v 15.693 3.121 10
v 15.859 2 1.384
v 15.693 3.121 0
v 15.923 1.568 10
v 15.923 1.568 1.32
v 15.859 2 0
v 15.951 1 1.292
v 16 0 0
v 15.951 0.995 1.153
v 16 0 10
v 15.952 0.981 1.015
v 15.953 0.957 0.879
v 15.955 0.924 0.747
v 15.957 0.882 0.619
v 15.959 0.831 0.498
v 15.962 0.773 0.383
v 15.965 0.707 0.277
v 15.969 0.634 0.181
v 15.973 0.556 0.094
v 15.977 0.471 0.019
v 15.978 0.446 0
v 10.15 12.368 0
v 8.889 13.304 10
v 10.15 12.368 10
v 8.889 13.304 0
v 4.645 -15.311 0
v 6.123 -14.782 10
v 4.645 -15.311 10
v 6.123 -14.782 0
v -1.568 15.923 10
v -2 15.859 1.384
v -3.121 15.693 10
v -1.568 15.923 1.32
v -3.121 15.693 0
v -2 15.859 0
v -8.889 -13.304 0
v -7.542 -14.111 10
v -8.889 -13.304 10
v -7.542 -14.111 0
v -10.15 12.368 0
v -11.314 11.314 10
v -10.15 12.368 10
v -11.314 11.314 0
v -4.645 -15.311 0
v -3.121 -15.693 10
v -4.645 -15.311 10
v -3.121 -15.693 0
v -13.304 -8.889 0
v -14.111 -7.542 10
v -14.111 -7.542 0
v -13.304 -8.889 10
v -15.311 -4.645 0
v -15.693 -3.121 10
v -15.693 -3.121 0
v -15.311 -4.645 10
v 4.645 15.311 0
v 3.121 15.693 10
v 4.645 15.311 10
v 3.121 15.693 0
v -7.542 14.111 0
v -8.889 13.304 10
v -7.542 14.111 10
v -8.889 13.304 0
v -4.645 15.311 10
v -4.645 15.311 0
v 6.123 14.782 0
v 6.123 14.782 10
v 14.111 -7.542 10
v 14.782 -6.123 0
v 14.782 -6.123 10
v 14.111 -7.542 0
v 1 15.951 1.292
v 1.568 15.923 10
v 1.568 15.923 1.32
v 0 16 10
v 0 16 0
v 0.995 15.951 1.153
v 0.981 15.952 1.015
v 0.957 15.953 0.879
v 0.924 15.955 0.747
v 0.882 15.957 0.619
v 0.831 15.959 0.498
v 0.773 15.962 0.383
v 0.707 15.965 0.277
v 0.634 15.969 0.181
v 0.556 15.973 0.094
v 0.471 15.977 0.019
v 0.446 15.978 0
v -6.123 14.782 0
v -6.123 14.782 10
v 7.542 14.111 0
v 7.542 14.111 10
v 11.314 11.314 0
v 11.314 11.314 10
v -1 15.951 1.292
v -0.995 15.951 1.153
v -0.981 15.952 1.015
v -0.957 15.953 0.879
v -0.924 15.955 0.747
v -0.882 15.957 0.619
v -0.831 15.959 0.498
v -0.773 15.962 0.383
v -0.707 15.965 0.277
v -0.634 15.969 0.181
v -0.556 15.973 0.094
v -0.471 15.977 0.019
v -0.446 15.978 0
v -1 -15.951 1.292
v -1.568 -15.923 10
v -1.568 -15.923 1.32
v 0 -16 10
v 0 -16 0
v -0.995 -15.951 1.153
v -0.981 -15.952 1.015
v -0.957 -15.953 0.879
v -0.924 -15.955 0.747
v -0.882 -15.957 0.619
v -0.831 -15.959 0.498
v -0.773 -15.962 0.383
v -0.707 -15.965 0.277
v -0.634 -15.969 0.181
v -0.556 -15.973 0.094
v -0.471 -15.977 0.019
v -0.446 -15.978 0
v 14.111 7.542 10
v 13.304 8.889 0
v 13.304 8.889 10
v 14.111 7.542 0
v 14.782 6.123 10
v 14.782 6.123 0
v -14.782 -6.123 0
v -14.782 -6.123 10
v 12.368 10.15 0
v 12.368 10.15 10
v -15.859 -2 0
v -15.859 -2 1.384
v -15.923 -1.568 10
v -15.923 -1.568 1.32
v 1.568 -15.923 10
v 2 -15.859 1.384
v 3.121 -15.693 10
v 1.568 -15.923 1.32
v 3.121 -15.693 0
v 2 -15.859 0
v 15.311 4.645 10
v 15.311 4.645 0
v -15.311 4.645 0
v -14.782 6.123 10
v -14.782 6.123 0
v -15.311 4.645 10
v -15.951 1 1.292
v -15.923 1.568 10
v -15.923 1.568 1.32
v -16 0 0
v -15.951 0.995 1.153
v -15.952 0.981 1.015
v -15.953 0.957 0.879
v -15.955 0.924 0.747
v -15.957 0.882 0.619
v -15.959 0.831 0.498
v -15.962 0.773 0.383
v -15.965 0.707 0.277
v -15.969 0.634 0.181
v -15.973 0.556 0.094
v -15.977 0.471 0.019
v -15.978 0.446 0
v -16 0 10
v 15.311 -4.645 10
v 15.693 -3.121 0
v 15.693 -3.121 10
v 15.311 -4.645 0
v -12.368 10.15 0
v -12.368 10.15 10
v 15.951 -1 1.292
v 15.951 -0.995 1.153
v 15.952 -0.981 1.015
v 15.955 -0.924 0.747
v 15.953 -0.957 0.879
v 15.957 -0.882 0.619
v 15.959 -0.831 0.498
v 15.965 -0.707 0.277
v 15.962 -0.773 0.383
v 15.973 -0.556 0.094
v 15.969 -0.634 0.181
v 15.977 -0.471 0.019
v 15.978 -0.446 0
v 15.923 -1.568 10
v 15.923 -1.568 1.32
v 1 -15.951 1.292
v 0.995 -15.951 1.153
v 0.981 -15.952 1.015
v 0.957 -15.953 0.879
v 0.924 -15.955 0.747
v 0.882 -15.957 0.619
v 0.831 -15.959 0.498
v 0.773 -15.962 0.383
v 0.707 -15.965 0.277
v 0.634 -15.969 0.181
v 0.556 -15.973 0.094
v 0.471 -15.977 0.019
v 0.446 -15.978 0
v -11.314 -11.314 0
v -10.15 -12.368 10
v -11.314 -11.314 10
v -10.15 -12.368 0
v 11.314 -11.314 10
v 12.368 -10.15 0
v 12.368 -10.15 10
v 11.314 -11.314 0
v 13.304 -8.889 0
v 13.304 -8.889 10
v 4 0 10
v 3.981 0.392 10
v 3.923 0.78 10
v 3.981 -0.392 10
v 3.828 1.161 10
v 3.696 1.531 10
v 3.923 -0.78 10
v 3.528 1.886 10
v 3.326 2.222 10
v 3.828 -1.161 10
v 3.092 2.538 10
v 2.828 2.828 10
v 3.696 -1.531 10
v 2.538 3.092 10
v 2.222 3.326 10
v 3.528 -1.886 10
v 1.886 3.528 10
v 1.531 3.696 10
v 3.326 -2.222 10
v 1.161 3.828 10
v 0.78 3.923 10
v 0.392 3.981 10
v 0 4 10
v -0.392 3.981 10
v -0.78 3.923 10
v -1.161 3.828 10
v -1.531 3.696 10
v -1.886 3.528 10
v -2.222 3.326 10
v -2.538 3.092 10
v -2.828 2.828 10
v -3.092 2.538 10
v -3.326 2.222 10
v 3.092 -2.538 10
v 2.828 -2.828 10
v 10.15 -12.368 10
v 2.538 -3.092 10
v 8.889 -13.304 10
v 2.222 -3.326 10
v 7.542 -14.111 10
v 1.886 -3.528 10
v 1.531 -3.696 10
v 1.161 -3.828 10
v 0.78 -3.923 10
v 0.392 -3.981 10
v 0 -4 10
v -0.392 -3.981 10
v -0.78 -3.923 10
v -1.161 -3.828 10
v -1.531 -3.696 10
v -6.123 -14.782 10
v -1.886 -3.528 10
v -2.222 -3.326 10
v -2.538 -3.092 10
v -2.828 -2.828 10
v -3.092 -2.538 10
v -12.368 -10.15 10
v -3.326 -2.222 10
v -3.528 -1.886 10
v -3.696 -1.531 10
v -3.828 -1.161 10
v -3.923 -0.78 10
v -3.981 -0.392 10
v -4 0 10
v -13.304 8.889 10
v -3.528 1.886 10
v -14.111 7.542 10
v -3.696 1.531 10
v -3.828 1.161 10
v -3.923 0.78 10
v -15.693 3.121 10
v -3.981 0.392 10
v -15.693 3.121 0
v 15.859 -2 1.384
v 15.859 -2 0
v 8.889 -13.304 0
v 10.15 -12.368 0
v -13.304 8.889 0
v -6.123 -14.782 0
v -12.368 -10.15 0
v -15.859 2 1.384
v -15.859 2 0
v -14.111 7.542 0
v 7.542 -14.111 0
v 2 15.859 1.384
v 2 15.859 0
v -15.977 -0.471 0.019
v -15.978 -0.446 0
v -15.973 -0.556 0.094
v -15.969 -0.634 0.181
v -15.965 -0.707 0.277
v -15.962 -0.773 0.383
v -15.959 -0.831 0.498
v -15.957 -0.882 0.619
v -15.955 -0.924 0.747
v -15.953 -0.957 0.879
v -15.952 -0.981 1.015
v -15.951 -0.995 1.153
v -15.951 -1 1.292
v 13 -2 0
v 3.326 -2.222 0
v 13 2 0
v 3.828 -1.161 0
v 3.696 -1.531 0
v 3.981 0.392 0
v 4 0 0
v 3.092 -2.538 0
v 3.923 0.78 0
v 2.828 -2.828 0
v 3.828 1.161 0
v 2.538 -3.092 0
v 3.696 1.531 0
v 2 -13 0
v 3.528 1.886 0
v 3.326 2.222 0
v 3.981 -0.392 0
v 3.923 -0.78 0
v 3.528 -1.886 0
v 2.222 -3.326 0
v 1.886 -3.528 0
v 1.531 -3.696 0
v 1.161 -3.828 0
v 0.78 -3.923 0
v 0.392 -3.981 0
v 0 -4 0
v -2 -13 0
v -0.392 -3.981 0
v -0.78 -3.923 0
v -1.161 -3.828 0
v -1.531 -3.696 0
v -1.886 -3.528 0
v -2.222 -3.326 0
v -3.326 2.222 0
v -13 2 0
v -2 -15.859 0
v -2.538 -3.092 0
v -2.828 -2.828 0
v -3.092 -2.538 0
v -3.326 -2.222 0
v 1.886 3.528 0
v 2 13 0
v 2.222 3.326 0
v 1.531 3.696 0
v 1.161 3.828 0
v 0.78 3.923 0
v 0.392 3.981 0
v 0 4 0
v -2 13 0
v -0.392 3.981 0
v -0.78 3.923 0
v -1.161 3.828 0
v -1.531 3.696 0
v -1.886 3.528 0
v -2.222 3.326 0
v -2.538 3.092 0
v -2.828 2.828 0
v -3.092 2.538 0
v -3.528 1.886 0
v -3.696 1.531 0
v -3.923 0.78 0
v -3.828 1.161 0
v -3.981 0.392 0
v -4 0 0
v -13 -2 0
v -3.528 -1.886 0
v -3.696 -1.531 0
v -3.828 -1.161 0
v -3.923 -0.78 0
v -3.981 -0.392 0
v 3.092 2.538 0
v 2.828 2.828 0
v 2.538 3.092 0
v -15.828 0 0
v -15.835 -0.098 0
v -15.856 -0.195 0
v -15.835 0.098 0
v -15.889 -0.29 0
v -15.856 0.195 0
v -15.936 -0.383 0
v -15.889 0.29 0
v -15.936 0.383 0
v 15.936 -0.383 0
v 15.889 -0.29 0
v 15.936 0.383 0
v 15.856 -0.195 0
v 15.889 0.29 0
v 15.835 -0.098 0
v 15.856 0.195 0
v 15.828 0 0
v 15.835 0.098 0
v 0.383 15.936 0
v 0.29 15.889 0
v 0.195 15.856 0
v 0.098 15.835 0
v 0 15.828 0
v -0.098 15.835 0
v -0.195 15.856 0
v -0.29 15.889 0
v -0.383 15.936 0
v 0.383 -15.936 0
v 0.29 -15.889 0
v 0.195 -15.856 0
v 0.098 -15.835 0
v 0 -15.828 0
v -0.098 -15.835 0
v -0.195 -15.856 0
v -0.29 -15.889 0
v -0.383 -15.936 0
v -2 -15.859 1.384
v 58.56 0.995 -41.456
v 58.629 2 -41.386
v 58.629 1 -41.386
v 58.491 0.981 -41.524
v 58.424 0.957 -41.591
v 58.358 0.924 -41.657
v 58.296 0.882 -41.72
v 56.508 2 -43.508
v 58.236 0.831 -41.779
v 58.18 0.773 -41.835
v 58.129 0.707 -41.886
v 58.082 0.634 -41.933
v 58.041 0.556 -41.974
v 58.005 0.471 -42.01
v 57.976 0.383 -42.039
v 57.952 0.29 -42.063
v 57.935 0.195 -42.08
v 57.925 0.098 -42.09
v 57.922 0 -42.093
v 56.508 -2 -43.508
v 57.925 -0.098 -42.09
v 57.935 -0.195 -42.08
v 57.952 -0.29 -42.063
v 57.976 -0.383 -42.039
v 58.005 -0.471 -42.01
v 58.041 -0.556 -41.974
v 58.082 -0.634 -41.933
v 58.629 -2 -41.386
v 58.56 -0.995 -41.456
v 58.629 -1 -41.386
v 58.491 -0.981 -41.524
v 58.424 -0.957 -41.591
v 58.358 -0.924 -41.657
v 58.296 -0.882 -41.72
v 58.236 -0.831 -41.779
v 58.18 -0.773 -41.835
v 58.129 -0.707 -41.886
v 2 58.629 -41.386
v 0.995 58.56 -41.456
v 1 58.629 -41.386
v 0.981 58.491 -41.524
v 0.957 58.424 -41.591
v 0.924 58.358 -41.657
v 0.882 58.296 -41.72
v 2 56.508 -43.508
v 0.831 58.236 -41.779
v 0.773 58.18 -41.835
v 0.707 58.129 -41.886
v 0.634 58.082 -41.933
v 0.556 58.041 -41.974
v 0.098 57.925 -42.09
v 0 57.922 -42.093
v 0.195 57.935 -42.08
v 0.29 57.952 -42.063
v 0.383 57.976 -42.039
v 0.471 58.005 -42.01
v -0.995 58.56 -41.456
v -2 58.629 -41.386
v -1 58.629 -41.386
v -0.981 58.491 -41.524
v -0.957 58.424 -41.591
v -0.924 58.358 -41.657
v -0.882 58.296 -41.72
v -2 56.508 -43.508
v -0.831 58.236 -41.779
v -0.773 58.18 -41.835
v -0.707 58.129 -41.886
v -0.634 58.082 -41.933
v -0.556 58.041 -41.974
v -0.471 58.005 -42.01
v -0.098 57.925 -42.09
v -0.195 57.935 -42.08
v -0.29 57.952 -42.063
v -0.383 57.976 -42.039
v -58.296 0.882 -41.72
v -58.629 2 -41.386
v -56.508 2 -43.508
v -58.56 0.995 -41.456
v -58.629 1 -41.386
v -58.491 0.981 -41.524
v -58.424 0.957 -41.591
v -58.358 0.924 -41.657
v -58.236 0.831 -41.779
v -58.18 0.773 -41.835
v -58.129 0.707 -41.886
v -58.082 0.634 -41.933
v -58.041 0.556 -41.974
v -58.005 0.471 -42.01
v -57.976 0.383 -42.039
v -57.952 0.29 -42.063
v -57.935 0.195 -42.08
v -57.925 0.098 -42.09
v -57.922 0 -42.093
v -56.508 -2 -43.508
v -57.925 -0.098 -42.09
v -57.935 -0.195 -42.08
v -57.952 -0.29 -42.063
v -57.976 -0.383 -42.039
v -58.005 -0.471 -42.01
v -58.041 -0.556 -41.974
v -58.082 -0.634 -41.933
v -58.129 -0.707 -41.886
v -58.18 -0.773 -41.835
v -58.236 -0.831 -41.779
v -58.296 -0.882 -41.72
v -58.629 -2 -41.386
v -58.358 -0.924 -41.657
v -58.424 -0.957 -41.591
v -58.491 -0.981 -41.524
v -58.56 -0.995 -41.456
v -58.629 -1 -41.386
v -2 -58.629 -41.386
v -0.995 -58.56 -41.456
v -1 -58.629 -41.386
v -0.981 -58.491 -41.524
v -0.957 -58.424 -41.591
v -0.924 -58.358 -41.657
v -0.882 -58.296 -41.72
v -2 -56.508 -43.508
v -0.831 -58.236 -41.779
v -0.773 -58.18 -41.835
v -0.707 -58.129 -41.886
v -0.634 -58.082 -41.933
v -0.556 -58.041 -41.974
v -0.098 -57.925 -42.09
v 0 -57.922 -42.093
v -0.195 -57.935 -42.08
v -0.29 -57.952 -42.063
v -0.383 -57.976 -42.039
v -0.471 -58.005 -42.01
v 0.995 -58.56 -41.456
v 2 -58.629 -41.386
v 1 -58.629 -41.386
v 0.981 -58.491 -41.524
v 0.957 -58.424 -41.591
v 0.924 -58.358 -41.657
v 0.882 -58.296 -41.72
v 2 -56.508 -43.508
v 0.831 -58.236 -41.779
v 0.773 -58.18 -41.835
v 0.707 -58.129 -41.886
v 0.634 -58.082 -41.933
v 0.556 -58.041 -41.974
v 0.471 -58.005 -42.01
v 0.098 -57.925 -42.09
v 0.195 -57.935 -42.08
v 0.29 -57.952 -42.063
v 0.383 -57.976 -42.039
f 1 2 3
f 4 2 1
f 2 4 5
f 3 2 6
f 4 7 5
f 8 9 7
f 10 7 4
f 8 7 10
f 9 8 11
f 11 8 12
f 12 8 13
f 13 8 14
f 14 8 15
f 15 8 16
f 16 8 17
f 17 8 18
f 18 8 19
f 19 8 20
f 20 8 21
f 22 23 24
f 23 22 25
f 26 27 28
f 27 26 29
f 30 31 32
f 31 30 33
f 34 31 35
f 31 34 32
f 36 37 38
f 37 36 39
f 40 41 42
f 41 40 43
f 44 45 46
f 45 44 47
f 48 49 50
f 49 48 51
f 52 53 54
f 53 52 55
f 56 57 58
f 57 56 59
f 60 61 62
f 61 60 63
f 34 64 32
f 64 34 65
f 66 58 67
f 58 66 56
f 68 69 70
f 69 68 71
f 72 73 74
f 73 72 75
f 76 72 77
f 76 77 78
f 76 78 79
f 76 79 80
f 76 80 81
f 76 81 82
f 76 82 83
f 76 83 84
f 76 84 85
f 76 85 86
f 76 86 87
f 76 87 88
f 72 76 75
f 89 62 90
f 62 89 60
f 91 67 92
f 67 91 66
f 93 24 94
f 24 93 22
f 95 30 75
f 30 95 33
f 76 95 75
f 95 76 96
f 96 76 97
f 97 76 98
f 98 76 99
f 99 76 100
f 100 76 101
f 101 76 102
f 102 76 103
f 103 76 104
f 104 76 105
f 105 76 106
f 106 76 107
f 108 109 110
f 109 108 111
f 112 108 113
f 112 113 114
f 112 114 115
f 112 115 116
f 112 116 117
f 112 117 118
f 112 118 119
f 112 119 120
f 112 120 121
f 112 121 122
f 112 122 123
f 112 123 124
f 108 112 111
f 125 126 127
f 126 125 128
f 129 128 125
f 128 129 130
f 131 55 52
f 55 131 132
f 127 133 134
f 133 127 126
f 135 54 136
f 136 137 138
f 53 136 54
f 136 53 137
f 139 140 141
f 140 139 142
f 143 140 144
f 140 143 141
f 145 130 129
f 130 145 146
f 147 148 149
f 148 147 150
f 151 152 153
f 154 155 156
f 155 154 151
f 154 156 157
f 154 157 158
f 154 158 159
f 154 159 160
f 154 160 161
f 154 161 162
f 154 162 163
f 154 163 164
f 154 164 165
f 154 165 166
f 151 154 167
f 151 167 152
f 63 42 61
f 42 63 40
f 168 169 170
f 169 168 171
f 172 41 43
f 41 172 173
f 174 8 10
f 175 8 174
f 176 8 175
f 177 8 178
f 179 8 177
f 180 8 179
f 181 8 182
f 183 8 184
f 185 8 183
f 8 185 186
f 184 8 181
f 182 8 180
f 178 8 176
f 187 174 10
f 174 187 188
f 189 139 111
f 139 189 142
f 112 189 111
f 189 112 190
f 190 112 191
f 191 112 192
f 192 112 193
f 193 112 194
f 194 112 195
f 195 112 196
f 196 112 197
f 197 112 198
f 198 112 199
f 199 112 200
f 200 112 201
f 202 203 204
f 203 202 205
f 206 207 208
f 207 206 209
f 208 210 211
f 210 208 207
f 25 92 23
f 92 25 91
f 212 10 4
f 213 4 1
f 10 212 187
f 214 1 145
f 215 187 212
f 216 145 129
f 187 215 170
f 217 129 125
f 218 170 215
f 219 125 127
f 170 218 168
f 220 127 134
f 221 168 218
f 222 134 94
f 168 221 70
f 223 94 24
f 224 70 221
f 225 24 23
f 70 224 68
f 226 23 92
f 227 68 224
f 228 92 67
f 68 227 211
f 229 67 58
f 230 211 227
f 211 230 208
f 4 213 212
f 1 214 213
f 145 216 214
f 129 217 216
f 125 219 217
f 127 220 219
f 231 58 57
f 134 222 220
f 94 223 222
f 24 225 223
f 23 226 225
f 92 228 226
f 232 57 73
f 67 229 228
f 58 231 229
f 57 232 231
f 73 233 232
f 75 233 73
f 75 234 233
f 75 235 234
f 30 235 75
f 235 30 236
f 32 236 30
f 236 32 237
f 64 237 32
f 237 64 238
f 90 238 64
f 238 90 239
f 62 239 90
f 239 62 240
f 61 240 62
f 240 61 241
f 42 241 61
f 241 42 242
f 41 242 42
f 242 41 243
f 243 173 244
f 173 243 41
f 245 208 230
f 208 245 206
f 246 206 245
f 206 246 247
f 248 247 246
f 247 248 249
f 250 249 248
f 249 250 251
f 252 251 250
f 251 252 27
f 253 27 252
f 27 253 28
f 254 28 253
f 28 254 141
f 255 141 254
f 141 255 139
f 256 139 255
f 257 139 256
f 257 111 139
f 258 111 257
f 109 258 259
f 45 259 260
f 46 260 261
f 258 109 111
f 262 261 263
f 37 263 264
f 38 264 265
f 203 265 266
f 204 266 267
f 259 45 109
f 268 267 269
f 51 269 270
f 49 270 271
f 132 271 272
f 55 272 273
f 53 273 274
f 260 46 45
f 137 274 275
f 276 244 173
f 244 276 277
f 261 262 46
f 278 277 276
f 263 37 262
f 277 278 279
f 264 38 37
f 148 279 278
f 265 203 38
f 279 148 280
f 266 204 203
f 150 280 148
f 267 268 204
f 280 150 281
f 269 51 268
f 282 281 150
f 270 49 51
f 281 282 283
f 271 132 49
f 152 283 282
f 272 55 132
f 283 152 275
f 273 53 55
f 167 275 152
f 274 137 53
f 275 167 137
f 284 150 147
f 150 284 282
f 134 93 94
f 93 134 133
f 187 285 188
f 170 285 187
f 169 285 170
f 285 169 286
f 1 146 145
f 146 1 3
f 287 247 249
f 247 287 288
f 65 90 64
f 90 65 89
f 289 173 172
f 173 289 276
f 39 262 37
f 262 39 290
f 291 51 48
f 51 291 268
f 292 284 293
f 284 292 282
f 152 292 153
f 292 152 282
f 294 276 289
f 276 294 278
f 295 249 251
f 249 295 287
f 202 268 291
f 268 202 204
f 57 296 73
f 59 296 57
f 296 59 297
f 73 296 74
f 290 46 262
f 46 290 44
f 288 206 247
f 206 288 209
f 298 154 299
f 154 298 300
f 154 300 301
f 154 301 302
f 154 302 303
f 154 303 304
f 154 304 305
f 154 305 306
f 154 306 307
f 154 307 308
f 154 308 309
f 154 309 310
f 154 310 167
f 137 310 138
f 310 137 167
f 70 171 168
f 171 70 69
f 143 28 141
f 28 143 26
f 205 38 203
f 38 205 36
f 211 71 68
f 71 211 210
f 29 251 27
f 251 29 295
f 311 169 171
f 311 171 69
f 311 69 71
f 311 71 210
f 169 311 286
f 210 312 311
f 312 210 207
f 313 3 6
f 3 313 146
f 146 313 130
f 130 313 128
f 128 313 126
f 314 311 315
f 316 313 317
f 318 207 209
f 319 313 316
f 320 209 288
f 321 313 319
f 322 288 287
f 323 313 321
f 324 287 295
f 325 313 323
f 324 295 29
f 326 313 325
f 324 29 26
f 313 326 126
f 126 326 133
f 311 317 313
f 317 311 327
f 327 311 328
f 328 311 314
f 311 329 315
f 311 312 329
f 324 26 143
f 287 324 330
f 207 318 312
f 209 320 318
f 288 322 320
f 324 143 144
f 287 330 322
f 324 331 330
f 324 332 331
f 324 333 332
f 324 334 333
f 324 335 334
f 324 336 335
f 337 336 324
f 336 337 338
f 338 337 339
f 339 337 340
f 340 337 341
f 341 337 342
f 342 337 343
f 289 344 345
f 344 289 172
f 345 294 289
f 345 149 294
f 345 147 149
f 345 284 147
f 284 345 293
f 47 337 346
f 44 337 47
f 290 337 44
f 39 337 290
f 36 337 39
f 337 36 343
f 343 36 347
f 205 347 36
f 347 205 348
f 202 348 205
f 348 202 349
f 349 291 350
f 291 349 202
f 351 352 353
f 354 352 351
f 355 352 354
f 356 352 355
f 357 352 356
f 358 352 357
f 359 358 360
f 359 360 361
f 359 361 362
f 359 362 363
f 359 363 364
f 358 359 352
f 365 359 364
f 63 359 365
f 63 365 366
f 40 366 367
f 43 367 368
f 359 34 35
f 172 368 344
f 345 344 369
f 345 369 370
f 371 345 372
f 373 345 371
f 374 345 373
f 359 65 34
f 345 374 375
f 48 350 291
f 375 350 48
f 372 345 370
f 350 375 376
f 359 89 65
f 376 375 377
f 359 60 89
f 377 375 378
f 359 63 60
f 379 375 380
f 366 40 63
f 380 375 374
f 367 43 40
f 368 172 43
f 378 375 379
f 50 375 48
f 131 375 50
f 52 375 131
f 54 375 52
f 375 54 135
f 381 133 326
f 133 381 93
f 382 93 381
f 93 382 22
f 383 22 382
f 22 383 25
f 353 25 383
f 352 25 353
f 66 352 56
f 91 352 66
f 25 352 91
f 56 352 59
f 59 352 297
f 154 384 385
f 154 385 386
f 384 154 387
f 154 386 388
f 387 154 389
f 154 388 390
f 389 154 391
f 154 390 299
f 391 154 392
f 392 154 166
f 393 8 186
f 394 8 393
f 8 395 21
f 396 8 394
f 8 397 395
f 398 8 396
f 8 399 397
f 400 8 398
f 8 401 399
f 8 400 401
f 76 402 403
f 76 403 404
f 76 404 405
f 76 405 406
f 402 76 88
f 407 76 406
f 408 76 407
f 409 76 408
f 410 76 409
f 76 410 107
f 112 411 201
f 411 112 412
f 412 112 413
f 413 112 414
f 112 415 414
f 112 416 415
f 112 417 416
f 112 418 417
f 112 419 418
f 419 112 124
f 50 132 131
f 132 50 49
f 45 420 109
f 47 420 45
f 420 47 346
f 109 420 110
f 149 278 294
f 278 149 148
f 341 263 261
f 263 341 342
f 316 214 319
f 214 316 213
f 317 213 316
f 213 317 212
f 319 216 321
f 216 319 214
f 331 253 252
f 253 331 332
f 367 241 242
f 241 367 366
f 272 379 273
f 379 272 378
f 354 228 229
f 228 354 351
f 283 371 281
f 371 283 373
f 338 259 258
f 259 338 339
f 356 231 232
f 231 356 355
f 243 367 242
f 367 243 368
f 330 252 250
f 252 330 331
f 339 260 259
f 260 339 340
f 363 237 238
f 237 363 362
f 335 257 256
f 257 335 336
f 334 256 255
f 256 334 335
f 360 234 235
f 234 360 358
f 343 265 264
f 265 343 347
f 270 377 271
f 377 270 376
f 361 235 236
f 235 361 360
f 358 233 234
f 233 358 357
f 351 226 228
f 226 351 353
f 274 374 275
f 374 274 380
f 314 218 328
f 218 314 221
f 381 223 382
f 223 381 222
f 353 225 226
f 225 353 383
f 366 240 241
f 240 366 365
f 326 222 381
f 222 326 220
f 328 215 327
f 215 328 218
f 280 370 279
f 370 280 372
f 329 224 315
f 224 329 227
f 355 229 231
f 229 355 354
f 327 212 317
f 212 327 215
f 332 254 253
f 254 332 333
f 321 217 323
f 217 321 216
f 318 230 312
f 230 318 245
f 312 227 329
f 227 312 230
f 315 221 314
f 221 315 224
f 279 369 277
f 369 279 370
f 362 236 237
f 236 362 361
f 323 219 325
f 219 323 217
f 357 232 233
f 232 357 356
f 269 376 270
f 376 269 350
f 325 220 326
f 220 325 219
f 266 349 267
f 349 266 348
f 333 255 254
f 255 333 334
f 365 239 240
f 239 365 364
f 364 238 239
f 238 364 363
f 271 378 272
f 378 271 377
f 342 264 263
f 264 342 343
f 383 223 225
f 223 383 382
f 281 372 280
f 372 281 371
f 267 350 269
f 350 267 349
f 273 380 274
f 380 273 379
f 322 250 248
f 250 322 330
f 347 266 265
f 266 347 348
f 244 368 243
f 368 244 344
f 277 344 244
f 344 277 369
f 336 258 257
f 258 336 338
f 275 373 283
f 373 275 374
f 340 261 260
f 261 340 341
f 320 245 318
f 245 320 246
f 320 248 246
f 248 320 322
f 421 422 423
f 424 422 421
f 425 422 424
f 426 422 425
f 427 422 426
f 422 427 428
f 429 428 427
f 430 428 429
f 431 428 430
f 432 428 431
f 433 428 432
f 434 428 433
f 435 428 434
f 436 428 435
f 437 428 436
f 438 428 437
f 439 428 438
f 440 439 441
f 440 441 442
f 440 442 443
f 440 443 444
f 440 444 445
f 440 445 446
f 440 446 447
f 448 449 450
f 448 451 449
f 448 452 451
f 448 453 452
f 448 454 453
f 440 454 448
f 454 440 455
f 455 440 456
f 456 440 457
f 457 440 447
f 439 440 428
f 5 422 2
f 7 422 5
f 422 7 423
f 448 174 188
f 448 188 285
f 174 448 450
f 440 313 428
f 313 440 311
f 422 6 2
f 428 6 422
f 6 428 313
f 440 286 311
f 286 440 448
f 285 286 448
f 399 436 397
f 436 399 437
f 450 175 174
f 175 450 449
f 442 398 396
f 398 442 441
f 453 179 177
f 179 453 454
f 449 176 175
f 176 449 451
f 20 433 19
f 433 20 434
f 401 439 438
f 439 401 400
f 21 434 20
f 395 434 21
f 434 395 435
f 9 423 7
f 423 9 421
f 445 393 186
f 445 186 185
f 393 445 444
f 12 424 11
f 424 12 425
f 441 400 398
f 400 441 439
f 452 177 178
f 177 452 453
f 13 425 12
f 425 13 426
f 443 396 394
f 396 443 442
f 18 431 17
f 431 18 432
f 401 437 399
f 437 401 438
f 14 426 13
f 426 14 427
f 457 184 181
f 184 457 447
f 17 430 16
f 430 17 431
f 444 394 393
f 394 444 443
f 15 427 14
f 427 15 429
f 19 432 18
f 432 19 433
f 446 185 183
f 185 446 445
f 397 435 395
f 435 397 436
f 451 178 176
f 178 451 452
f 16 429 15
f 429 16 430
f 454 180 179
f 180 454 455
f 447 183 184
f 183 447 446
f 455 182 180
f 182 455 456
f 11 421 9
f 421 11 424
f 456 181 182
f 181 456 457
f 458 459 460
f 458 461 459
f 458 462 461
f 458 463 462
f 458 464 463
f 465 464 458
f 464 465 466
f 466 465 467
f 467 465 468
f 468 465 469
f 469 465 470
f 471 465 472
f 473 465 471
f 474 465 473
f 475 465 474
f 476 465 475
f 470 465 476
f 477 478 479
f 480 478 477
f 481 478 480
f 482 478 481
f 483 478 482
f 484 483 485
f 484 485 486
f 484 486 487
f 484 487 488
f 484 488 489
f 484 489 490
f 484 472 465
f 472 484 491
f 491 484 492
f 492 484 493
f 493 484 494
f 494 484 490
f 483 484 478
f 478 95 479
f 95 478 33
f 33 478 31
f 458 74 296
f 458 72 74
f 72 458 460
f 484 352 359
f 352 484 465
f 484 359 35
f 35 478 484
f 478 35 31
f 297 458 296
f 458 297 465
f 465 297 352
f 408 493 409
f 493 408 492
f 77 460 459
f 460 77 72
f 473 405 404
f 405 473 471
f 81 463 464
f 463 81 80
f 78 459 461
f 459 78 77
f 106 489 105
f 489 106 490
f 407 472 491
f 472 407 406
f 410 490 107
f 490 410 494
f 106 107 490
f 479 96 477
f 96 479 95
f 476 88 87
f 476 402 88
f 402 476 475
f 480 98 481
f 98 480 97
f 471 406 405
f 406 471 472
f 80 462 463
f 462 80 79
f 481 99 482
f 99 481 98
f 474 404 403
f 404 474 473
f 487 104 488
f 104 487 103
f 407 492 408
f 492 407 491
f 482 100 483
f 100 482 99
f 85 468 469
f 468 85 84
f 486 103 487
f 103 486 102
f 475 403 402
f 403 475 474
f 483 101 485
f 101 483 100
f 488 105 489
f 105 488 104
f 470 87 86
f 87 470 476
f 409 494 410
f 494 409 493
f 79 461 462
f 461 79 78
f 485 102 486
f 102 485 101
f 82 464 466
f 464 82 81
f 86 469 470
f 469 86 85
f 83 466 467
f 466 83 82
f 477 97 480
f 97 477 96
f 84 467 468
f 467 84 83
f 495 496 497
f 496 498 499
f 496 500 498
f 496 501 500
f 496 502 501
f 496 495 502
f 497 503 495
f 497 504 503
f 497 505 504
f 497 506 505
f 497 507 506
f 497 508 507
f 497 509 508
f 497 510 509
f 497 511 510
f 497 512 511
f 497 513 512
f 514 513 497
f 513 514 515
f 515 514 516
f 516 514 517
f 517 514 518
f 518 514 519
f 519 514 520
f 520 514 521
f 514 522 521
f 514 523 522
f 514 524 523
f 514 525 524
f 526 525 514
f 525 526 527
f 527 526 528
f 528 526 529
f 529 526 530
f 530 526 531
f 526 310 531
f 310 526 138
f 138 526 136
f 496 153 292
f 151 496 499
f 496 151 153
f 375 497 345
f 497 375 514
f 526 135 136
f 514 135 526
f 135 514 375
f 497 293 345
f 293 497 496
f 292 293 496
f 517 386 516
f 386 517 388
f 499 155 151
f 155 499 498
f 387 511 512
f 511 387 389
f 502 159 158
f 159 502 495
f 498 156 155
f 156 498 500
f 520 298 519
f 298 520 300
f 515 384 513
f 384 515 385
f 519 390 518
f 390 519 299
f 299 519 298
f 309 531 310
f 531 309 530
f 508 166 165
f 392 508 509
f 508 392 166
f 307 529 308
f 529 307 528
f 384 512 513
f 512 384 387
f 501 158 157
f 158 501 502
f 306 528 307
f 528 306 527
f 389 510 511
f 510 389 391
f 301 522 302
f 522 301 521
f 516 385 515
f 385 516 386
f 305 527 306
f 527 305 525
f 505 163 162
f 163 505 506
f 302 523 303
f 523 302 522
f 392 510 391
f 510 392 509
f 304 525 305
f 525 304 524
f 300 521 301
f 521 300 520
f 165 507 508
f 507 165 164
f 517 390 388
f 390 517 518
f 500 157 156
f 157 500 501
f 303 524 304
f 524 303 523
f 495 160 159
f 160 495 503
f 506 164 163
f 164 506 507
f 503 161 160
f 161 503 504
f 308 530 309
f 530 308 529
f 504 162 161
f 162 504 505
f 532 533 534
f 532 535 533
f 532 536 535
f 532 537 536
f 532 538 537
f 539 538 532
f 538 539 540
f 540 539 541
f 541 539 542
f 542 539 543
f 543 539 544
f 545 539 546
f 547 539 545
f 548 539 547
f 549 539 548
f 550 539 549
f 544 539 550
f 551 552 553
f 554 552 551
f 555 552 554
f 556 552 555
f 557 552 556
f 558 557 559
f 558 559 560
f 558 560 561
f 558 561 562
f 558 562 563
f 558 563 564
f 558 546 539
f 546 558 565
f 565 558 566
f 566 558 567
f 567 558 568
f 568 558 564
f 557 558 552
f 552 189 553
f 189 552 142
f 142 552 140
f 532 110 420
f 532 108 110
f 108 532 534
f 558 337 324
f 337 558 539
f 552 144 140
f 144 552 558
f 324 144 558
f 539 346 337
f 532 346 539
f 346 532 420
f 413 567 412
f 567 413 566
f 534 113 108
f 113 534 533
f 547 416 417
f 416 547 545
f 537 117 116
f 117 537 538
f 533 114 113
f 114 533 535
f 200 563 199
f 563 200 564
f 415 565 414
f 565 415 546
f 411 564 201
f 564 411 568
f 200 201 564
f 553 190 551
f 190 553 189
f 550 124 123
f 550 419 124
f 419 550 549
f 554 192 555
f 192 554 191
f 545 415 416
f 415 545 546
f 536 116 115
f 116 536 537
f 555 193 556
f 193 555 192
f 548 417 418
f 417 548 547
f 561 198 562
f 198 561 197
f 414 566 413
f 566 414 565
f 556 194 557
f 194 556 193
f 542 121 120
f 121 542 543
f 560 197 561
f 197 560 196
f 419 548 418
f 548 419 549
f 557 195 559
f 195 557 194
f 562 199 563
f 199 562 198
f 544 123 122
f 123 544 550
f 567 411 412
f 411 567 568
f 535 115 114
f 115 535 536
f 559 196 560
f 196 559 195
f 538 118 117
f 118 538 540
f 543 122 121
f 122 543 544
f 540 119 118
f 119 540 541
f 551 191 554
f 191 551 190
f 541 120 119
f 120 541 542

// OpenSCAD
// ============================================================
// Soporte de antena ground-plane 1090 MHz (ADS-B)
// Proyecto 01 - Portfolio de Telecomunicaciones
//
// Base para conector SMA panel-mount + 4 brazos guía de radiales
// a 45 grados bajo la horizontal + canal central para el radiador.
//
// Uso: abrir en OpenSCAD (openscad.org, gratuito), ajustar
// parámetros según tu conector/hilo real, exportar a STL.
// ============================================================

// --- Parámetros ajustables ---
base_diameter   = 32;    // diámetro de la base [mm]
base_height     = 10;    // altura de la base [mm]
connector_hole  = 8;     // diámetro del taladro para el conector SMA [mm] - AJUSTAR a tu conector real
wire_channel_d  = 1.6;   // diámetro del canal para el hilo (radiador/radiales) [mm]
radial_length   = 68.6;  // longitud de cada brazo guía de radial [mm]
radial_angle    = 45;    // ángulo del radial respecto a la horizontal [grados]
n_radials       = 4;     // número de radiales
arm_width       = 4;     // ancho de cada brazo guía [mm]
arm_height      = 3;     // altura/grosor de cada brazo guía [mm]

$fn = 64; // resolución de curvas

module base() {
    difference() {
        cylinder(d = base_diameter, h = base_height);
        // taladro central para el conector SMA
        translate([0, 0, -1])
            cylinder(d = connector_hole, h = base_height + 2);
        // canal central para el hilo del radiador, saliendo hacia arriba
        translate([0, 0, base_height - 4])
            cylinder(d = wire_channel_d + 0.6, h = 6);
    }
}

module radial_arm() {
    // Brazo con canal en forma de "V" poco profundo para alojar el hilo
    difference() {
        cube([radial_length, arm_width, arm_height], center = false);
        translate([0, arm_width/2, arm_height])
            rotate([0, 90, 0])
            cylinder(d = wire_channel_d + 0.4, h = radial_length + 2, center = false);
    }
}

module radial_arms() {
    // overlap: cuánto se introduce cada brazo dentro de la base para
    // garantizar una unión sólida y fusionada al imprimir (crítico para
    // que el slicer no genere dos piezas separadas)
    overlap = 8;
    for (i = [0 : n_radials - 1]) {
        rotate([0, 0, i * (360 / n_radials)])
            translate([base_diameter/2 - overlap, -arm_width/2, base_height/2])
            rotate([0, radial_angle, 0])
            radial_arm();
    }
}

module antenna_mount() {
    base();
    radial_arms();
}

antenna_mount();

// ============================================================
// Notas de fabricación:
// - Imprimir con soporte en los brazos si tu impresora lo requiere
//   (ángulo de 45° suele imprimirse sin soporte en la mayoría de FDM).
// - Material recomendado: PETG (mejor resistencia a intemperie que PLA
//   si vas a dejar la antena fuera, ej. en el techo/balcón).
// - El hilo de cobre se pasa a través de los canales y se suelda
//   al conector SMA por dentro de la base.
// ============================================================
